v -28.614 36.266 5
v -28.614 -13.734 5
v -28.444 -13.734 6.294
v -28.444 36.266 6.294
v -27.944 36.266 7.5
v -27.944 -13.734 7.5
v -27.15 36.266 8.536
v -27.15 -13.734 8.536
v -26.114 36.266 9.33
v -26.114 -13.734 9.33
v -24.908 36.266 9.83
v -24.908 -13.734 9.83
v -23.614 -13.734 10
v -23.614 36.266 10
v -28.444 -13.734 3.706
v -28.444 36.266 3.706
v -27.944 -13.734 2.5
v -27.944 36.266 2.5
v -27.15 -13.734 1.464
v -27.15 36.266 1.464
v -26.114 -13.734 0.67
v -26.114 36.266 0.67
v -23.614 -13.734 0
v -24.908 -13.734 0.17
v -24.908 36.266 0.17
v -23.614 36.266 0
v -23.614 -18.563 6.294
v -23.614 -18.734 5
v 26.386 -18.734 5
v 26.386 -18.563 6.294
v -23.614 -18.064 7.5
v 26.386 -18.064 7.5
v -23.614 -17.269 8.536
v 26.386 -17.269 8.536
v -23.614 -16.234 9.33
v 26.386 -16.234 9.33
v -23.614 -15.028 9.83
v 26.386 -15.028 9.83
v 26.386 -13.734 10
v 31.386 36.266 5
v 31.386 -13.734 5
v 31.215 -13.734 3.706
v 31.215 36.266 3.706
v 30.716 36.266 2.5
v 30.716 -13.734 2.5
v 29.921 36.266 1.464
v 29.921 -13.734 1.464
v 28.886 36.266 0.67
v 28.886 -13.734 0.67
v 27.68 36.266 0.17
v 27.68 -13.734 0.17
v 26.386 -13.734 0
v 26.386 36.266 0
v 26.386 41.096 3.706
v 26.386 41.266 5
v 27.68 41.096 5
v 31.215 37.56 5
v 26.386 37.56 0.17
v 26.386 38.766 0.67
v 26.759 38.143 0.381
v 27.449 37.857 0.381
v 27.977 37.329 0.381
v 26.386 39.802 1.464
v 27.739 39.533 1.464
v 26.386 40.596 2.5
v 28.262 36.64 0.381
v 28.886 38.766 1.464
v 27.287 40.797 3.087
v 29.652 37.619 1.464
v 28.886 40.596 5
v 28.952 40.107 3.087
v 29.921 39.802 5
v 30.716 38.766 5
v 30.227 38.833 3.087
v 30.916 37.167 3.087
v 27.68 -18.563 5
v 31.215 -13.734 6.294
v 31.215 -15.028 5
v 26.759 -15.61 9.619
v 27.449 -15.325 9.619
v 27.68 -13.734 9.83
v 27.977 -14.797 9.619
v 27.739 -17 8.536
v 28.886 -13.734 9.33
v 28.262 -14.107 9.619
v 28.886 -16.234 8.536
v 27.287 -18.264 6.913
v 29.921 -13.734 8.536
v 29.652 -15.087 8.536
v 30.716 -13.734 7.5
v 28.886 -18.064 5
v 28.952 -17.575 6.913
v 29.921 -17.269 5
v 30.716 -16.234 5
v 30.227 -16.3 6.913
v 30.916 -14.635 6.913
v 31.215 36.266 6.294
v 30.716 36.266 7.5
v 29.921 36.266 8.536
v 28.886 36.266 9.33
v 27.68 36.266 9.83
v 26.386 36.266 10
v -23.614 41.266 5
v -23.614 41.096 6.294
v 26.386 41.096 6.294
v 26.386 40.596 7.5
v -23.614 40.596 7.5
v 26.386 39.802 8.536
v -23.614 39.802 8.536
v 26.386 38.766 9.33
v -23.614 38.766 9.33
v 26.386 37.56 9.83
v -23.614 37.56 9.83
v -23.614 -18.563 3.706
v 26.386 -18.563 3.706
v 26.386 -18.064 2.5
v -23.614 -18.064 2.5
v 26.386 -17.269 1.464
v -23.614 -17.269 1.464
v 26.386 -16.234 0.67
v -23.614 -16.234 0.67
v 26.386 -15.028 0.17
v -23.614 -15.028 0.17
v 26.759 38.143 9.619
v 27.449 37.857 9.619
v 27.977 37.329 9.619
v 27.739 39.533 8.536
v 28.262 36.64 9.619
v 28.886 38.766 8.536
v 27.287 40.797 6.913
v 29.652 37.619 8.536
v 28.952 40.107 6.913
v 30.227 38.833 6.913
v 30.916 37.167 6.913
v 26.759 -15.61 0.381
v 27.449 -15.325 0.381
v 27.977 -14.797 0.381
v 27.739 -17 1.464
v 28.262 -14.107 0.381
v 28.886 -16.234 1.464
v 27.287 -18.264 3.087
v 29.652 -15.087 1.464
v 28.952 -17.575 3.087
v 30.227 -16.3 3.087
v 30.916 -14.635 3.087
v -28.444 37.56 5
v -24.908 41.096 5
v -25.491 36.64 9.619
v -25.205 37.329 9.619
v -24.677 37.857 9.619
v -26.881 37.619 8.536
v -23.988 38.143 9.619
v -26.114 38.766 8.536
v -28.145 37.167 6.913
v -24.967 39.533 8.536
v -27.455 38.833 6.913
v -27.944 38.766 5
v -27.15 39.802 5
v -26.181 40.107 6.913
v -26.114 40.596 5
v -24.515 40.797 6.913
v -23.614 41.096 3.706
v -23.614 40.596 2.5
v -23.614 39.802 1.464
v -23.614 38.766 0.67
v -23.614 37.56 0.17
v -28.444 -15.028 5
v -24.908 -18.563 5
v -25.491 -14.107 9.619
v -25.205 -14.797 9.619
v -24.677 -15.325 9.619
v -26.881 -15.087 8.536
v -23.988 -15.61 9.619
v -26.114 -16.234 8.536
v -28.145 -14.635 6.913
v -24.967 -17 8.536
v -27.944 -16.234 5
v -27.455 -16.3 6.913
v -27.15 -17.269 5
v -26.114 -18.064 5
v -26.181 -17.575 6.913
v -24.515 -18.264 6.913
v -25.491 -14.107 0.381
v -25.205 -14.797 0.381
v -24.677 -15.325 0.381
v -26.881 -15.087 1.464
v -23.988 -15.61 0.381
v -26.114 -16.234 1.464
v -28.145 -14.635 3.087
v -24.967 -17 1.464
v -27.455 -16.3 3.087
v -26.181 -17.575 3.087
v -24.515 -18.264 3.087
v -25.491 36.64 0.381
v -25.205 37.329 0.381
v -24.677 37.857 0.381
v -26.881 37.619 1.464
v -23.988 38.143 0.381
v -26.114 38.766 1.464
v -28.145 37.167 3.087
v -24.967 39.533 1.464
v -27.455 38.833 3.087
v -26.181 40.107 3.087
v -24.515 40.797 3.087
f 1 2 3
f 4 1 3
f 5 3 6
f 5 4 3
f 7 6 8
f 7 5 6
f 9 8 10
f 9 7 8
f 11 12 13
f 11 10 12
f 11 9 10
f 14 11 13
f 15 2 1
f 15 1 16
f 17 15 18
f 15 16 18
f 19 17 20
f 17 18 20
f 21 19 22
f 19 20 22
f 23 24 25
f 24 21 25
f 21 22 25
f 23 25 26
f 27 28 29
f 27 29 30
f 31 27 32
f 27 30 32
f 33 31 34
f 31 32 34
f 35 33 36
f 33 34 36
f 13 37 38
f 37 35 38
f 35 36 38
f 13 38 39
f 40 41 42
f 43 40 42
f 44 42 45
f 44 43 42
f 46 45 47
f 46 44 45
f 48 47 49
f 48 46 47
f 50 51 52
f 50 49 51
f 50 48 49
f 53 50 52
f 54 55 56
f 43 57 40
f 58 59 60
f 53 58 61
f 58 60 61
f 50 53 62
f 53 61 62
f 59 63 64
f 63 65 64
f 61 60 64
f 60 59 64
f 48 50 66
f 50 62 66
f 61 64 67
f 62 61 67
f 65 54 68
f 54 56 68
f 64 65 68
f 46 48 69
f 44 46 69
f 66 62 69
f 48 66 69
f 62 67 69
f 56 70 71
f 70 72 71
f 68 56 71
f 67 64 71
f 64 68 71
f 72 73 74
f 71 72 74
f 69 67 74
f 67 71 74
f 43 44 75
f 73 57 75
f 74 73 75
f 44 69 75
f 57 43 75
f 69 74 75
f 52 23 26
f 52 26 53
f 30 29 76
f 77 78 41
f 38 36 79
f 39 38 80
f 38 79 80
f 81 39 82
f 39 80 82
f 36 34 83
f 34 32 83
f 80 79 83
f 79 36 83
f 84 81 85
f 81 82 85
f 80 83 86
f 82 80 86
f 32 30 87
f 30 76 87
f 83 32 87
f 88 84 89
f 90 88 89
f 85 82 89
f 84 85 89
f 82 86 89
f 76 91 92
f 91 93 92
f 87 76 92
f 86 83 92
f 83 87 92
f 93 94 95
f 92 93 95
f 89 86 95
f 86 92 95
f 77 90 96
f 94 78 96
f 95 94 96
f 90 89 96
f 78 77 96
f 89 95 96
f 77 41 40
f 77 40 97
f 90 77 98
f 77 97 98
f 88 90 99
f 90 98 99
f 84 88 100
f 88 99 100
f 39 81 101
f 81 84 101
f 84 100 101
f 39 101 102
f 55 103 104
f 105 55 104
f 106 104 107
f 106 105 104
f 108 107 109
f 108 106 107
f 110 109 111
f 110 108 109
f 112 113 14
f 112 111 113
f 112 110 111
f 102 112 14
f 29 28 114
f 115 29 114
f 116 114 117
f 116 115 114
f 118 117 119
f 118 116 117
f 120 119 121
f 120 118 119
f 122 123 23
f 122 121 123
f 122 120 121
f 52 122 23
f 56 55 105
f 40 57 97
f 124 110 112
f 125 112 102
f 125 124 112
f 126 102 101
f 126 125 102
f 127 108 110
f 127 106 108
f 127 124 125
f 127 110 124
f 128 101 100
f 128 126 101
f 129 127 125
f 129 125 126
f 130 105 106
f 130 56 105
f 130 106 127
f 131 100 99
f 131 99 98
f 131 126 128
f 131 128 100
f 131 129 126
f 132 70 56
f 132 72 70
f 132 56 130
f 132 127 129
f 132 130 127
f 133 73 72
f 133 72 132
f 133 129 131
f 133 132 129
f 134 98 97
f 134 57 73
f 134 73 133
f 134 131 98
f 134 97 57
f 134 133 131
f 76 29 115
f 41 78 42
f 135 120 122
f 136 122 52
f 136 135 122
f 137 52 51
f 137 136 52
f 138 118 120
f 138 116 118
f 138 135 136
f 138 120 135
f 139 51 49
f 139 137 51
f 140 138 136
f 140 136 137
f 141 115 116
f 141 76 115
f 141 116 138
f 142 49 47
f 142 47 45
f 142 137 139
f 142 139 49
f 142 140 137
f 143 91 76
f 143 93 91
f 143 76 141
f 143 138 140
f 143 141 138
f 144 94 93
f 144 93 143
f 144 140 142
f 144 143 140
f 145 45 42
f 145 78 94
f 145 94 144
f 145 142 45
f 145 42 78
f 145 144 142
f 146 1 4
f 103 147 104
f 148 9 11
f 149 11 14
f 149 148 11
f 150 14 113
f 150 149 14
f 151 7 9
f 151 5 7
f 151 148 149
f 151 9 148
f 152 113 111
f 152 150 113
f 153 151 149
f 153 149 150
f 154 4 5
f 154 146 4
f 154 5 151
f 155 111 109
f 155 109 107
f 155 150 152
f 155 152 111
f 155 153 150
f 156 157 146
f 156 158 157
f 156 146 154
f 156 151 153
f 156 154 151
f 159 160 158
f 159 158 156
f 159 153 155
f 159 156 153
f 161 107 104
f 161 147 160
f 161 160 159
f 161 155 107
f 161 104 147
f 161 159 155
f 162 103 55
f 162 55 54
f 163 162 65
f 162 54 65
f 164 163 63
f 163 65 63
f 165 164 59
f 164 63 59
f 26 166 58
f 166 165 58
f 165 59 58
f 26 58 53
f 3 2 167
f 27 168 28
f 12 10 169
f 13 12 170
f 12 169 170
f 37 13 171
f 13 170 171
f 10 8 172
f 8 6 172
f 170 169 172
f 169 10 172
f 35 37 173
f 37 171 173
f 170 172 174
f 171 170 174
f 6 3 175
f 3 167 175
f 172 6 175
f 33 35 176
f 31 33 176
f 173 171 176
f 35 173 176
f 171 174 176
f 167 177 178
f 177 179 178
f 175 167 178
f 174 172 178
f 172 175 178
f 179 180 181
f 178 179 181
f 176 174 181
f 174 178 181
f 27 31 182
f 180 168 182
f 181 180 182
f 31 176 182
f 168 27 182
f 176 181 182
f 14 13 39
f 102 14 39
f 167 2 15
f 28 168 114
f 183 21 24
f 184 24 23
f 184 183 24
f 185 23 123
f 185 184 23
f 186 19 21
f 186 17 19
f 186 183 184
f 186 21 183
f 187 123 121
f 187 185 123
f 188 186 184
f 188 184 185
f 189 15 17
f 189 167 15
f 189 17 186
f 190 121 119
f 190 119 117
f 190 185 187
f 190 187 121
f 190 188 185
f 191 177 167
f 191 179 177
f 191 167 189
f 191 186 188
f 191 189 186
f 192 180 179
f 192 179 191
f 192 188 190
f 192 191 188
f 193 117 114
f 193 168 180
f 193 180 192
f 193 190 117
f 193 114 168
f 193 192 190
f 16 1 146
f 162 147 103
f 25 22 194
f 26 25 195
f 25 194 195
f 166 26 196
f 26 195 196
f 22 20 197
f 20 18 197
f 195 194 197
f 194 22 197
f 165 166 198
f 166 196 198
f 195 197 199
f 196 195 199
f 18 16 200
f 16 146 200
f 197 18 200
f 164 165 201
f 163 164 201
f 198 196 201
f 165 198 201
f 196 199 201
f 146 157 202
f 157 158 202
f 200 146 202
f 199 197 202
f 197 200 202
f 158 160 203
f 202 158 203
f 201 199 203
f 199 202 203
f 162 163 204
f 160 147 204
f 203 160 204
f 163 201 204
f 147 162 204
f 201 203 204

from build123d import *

# Parameters (mm, degrees)
F0_W     = 60
F0_H     = 60
F1_DEPTH = 10
F2_R     = 4.99999


# Not quite as in the source:
# - a fillet or chamfer is up to 0.001 mm smaller than in the source, because OpenCascade refuses the exact size


with BuildPart() as f1:
    # F0 (on Top) → F1 (new body)
    with BuildSketch(Plane.XY):
        with Locations((1.3857496455, 11.266246149)):
            Rectangle(F0_W, F0_H)
    extrude(amount=F1_DEPTH)

    # F2 (radius 5 in the source; OpenCascade refuses exactly that, so slightly less here)
    f2_edges = [f1.edges().sort_by_distance(p)[0] for p in [
        (-28.61425, 41.266246, 5),
        (-28.61425, -18.733754, 5),
        (-28.61425, 11.266246, 0),
        (-28.61425, 11.266246, 10),
        (31.38575, 41.266246, 5),
        (1.38575, 41.266246, 0),
        (1.38575, 41.266246, 10),
        (31.38575, -18.733754, 5),
        (1.38575, -18.733754, 0),
        (1.38575, -18.733754, 10),
        (31.38575, 11.266246, 0),
        (31.38575, 11.266246, 10),
    ]]
    fillet(f2_edges, radius=F2_R)


solid = f1.part
